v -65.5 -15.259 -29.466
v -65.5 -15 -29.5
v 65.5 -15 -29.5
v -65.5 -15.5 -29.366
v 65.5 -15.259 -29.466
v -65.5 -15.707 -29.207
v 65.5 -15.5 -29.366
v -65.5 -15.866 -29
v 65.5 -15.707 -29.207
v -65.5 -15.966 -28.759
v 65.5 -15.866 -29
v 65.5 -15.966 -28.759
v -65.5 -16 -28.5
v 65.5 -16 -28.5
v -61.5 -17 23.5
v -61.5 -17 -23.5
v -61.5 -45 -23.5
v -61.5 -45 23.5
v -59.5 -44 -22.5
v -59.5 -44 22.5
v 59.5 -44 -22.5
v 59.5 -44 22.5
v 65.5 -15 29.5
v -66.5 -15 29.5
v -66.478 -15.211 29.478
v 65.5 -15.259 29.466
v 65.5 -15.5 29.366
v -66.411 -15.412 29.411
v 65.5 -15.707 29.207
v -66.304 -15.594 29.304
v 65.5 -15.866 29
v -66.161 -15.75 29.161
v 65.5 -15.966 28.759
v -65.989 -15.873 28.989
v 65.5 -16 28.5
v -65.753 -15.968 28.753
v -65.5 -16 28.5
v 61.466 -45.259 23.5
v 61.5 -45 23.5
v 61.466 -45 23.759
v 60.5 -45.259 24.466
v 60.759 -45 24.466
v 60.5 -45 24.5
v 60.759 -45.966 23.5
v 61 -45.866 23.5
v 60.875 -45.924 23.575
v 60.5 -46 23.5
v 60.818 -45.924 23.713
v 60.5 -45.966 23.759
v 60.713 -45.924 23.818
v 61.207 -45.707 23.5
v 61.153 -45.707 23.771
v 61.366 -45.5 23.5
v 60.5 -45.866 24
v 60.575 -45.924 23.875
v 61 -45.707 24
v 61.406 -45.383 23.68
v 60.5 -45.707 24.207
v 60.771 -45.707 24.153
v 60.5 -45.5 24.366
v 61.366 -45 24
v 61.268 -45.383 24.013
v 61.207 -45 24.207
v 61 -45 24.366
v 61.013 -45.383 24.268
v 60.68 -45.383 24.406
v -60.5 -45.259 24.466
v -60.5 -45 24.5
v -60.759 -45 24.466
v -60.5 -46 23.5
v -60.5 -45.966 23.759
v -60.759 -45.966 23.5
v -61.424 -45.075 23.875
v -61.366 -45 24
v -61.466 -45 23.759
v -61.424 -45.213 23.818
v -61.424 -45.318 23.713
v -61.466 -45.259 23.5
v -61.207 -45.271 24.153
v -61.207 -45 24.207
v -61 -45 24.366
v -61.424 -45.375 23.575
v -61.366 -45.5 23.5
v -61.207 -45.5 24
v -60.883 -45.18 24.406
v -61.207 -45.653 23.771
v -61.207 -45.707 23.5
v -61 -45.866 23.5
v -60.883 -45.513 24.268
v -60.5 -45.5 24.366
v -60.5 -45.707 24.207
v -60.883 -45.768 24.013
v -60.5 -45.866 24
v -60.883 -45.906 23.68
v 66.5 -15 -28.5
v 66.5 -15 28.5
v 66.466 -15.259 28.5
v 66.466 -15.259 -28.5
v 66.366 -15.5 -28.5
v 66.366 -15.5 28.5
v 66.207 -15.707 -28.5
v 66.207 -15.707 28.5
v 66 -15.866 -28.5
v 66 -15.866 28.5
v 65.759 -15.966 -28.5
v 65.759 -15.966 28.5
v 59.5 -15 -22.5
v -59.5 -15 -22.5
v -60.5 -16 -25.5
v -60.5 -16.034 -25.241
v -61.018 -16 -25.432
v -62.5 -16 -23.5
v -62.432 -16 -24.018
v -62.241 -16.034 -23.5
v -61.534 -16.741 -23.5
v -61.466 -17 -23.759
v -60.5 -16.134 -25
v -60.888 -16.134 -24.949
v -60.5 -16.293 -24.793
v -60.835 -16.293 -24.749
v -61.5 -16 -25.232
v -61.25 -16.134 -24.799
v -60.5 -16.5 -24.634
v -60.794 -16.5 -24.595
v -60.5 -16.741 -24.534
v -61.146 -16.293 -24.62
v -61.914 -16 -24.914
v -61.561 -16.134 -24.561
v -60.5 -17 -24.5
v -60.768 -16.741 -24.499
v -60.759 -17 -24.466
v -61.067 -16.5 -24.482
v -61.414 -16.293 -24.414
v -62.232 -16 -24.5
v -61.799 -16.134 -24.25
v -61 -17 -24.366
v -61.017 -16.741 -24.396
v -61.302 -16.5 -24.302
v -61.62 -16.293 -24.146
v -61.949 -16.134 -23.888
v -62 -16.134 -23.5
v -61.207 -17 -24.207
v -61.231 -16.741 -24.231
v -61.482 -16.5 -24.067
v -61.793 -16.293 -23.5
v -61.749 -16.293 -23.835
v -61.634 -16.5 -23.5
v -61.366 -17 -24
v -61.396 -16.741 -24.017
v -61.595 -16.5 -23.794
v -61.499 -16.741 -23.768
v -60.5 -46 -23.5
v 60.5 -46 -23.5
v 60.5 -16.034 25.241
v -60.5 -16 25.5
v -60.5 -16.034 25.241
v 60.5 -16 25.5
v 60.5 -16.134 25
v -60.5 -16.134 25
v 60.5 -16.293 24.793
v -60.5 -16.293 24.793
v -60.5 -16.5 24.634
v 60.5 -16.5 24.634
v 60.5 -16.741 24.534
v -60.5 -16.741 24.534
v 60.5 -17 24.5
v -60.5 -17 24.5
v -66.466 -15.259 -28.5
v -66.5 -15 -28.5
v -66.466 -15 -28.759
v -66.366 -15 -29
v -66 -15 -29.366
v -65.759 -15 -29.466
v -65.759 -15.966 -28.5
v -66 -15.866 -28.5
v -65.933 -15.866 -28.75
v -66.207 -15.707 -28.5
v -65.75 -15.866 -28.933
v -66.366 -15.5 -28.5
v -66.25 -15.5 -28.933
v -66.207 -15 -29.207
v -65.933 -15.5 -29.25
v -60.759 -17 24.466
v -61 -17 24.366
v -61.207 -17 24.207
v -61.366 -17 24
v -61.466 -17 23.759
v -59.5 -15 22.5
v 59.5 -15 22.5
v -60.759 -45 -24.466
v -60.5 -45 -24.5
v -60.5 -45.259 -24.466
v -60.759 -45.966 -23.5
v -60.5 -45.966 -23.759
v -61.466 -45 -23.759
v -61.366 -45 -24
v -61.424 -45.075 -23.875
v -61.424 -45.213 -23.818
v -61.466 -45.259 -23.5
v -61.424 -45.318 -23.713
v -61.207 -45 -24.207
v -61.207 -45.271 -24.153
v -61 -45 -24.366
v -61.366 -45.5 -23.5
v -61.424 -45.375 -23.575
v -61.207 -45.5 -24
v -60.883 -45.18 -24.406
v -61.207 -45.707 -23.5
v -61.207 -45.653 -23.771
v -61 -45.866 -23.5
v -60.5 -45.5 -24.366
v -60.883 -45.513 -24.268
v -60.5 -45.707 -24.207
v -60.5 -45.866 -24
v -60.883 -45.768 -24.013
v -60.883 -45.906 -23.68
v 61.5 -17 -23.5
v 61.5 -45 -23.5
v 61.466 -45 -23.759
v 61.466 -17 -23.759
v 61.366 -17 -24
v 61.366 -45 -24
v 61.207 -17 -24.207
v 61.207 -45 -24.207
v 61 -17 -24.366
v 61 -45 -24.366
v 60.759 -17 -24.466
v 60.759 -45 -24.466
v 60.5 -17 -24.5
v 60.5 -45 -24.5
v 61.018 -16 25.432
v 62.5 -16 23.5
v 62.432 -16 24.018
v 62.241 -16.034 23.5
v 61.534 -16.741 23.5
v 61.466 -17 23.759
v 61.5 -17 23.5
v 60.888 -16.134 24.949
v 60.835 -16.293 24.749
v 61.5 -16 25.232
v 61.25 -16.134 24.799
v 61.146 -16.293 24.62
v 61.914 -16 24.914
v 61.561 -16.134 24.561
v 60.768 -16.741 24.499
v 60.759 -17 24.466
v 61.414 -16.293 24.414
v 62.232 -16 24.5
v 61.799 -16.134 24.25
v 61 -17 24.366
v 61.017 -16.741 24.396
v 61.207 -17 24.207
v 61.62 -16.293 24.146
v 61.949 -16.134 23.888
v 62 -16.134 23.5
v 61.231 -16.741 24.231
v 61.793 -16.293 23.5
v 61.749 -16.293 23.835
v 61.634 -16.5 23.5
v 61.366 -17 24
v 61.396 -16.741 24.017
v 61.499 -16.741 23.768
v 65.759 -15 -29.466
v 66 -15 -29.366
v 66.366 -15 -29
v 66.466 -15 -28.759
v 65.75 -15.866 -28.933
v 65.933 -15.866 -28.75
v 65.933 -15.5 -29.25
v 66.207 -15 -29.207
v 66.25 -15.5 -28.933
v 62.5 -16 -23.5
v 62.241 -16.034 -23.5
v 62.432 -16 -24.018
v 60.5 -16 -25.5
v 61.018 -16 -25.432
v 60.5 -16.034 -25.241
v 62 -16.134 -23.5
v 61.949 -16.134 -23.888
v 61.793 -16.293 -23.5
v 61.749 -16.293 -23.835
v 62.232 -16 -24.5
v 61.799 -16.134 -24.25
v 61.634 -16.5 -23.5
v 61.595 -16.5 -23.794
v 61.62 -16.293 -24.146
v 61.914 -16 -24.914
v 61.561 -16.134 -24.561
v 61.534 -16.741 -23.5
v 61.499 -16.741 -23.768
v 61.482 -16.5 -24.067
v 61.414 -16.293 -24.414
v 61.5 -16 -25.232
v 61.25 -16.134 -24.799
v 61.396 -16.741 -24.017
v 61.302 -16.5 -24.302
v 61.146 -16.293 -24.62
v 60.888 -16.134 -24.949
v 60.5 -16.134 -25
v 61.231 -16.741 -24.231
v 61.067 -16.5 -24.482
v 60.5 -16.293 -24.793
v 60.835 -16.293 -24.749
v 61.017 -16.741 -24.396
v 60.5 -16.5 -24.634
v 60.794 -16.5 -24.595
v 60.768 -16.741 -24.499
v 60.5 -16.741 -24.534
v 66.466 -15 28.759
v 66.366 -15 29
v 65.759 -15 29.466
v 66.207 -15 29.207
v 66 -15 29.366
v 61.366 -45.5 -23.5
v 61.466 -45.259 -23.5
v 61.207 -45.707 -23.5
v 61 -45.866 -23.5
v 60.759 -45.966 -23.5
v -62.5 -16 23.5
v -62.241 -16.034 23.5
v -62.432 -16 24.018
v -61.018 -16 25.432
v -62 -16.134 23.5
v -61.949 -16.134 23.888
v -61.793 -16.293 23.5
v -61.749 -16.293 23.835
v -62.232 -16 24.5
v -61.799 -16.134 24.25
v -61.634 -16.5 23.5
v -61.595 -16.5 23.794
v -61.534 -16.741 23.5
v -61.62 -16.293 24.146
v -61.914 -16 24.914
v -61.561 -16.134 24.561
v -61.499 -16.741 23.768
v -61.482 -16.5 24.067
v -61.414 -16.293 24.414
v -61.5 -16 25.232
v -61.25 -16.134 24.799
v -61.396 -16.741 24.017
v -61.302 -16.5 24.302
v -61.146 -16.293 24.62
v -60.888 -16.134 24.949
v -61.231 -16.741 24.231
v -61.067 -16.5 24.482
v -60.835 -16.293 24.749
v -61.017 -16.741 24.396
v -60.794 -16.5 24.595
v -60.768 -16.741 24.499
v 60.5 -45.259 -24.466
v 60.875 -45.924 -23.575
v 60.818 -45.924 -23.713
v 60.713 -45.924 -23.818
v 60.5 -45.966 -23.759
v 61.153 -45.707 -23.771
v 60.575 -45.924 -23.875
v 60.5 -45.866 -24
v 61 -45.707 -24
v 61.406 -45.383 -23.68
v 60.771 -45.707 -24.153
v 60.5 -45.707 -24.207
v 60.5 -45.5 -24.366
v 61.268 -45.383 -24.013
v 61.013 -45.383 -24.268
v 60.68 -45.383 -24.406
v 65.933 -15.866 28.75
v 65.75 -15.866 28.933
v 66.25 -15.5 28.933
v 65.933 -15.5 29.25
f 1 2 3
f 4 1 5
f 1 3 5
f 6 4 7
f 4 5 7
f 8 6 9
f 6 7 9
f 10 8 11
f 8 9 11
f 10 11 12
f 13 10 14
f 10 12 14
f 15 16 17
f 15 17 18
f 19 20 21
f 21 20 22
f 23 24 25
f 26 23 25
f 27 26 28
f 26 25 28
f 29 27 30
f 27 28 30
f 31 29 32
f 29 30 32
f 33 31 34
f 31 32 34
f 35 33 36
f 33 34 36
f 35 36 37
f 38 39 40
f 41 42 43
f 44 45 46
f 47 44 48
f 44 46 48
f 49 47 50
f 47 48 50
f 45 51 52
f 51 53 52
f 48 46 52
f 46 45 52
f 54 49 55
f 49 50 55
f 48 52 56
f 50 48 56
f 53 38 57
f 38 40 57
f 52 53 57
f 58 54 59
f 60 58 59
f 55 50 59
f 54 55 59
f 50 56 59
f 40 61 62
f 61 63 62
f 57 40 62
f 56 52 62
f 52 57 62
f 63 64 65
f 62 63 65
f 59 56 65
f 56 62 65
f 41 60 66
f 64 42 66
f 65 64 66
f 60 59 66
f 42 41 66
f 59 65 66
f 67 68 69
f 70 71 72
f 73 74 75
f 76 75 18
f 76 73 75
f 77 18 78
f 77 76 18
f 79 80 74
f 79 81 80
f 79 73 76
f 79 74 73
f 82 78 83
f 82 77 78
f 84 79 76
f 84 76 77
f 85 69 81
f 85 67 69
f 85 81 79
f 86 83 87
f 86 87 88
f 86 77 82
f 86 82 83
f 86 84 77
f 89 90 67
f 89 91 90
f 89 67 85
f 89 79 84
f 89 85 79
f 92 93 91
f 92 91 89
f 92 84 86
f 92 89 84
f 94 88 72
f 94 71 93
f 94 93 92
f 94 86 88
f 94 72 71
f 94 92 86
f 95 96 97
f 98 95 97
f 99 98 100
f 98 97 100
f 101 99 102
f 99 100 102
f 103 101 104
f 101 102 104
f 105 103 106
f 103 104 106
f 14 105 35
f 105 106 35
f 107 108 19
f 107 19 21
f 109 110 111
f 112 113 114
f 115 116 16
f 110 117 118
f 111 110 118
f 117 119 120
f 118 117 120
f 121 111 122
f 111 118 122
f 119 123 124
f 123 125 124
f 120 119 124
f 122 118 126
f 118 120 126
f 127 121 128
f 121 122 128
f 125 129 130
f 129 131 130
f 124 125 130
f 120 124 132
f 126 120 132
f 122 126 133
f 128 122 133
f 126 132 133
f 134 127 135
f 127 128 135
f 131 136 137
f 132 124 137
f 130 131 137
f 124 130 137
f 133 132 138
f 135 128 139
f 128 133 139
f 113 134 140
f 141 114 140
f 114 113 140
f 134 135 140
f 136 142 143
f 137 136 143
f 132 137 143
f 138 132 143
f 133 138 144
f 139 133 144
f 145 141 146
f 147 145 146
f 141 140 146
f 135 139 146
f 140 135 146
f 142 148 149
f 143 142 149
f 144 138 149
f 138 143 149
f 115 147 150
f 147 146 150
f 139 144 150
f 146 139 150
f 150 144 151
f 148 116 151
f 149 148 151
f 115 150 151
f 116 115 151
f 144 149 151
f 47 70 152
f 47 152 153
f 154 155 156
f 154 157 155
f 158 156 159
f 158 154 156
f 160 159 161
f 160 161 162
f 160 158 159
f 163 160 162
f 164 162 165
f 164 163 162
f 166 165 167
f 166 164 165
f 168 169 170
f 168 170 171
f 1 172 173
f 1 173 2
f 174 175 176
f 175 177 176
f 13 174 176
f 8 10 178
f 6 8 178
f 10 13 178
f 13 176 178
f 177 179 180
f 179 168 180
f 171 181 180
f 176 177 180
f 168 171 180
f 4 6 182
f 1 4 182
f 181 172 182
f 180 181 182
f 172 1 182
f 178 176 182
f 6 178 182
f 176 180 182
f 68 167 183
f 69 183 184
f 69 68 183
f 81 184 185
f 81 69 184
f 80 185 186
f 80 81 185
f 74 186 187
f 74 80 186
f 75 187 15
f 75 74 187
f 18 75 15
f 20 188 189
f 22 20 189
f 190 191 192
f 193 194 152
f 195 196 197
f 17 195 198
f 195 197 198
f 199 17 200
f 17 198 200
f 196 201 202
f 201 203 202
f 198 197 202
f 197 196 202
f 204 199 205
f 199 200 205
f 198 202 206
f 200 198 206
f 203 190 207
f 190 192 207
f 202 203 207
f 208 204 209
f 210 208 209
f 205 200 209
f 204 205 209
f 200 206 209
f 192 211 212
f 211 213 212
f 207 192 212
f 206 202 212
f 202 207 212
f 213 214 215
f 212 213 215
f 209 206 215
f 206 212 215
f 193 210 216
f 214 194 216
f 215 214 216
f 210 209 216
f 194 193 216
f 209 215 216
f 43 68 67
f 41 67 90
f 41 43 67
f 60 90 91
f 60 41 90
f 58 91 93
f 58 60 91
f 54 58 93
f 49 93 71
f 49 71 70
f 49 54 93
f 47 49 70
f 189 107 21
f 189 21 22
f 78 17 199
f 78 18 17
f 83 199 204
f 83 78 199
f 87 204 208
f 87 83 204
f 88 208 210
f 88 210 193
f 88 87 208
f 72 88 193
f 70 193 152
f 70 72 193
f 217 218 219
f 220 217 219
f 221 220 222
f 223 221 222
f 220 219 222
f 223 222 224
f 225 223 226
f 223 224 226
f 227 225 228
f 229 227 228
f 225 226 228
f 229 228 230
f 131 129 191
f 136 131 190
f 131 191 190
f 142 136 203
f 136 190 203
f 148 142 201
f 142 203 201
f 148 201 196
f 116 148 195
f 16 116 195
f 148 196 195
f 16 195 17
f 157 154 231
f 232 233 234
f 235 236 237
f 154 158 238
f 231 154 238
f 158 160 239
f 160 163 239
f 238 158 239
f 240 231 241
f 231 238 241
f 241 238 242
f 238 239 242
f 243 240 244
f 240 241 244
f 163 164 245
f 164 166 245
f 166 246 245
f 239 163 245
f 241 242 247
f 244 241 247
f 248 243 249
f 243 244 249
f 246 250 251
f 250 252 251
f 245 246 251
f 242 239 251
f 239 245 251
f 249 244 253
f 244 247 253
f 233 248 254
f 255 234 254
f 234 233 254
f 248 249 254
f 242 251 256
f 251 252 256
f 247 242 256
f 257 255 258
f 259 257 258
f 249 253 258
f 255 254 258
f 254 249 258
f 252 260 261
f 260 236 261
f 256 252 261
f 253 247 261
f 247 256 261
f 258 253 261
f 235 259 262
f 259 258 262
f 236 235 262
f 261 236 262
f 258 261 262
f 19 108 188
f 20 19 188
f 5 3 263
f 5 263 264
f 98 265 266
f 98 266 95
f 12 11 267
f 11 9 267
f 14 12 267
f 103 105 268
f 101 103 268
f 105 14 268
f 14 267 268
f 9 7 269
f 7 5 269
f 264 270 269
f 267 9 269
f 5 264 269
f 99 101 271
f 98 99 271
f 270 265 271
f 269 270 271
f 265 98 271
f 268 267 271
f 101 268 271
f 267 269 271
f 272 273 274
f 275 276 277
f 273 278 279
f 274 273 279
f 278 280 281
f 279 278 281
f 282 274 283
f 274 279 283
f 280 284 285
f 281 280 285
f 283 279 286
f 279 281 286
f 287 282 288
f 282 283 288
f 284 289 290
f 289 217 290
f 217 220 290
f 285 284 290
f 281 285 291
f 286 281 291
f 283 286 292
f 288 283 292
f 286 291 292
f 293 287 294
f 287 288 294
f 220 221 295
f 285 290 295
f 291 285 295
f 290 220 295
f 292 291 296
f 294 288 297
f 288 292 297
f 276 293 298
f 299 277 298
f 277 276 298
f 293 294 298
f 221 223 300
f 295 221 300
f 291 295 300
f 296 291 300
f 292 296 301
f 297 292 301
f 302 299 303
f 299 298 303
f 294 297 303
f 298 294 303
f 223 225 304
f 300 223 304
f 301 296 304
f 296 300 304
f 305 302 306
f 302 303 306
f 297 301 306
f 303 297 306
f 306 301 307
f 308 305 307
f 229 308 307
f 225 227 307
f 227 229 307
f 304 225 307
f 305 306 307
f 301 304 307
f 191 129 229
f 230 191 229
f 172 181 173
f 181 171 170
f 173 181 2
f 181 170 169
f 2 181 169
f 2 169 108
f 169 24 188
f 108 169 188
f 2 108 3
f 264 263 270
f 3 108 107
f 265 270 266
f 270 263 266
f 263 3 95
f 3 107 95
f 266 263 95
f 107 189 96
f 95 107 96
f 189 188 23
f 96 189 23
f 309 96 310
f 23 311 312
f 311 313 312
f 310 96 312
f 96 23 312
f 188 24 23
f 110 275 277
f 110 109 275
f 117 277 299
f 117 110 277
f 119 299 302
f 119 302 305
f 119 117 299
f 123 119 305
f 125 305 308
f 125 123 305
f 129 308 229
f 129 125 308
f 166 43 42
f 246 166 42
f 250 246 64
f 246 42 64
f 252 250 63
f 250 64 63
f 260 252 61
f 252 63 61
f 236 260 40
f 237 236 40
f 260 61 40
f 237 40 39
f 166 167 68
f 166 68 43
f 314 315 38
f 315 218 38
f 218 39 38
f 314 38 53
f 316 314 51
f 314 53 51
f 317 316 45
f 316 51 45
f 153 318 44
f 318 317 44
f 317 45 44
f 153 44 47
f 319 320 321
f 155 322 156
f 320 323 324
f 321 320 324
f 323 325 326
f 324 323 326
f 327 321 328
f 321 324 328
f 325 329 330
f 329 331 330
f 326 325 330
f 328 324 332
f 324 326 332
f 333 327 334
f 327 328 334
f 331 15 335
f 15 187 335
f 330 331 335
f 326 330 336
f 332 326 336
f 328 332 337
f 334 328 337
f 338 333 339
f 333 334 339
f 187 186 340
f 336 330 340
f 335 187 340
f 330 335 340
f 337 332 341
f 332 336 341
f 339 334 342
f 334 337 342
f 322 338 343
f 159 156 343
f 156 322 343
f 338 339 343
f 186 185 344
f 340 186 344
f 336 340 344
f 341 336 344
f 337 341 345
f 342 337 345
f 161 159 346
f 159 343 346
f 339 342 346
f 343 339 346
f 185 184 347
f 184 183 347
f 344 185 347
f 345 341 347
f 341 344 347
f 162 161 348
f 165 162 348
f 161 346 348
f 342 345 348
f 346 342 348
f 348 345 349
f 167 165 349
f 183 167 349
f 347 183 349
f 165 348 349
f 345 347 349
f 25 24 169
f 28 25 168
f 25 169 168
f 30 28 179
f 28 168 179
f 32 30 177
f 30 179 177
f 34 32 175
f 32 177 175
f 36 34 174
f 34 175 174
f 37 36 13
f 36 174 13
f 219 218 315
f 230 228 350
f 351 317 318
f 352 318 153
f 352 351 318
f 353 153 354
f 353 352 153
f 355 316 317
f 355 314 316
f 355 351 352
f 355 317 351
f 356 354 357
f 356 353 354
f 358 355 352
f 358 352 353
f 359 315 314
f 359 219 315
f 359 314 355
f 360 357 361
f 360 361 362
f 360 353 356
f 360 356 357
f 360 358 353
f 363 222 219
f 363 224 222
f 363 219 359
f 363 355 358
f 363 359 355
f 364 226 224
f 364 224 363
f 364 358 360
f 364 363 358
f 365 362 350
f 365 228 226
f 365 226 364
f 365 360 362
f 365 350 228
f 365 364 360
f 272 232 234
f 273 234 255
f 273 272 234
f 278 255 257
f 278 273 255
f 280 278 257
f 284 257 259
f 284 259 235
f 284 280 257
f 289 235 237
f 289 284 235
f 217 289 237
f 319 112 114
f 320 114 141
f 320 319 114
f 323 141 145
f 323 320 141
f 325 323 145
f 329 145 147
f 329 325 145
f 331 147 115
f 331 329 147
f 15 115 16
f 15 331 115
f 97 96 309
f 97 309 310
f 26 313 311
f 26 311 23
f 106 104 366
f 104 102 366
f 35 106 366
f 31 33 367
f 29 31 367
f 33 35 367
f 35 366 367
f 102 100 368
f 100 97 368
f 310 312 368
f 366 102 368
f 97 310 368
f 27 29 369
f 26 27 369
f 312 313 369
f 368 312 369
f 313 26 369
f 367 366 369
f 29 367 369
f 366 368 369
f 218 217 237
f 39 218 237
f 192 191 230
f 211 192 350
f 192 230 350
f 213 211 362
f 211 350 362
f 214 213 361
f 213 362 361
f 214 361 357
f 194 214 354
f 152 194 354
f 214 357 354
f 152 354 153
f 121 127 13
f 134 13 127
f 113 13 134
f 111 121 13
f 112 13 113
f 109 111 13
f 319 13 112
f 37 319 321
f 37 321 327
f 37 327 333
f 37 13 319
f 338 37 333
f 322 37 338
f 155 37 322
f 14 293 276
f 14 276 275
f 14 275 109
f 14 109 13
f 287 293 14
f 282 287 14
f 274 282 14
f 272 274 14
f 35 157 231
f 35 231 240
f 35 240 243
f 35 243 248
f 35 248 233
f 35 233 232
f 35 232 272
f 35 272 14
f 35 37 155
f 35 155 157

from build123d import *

# Parameters (mm, degrees)
F1_W        = 123
F1_H        = 49
F1_W_2      = 119
F1_H_2      = 45
F2_DEPTH    = 31
F1_H_3      = 5
F3_DEPTH    = 1
F4_DEPTH    = 31
F5_DEPTH    = 29
F6_F1_R     = 0.9999
F6_F2_R     = 1
F7_T1_DEPTH = 3.5
F7_T4_ANGLE = 90
F7_T6_ANGLE = 90
F7_T8_ANGLE = 90


# Not quite as in the source:
# - a fillet or chamfer that OpenCascade refuses, or shapes differently, is made with other operations: its cross-section is extruded or revolved along the edge and cut away or added
# - a fillet or chamfer is up to 0.001 mm smaller than in the source, because OpenCascade refuses the exact size


with BuildPart() as f2:
    # F1 (on offset) → F2 (new body)
    with BuildSketch(Plane.XZ.offset(15)):
        Rectangle(F1_W, F1_H)
        Rectangle(F1_W_2, F1_H_2, mode=Mode.SUBTRACT)
    extrude(amount=F2_DEPTH)

    # F1 (on offset) → F3 (join)
    with BuildSketch(Plane.XZ.offset(15)):
        with Locations((0, 27)):
            Rectangle(F1_W, F1_H_3)
        Polygon((-61.5, -29.5), (-61.5, -24.5), (-61.5, 24.5), (-61.5, 29.5), (-66.5, 29.5), (-66.5, -29.5), align=None)
        with Locations((0, -27)):
            Rectangle(F1_W, F1_H_3)
        Polygon((61.5, 24.5), (61.5, -24.5), (61.5, -29.5), (66.5, -29.5), (66.5, 29.5), (61.5, 29.5), align=None)
    extrude(amount=F3_DEPTH)

    # F1 (on offset) → F4 (join)
    with BuildSketch(Plane.XZ.offset(15)):
        Rectangle(F1_W_2, F1_H_2)
    extrude(amount=F4_DEPTH)

    # F1 (on offset) → F5 (cut)
    with BuildSketch(Plane.XZ.offset(15)):
        Rectangle(F1_W_2, F1_H_2)
    extrude(amount=F5_DEPTH, mode=Mode.SUBTRACT)

    # F6: fillet of radius 1 on 14 edges, made by hand

    # F6_f1 (radius 1 in the source; OpenCascade refuses exactly that, so slightly less here)
    f6_f1_edges = [f2.edges().sort_by_distance(p)[0] for p in [
        (61.5, -31, 24.5),
        (61.5, -31, -24.5),
        (61.5, -46, 0),
        (0, -46, -24.5),
        (0, -46, 24.5),
        (-61.5, -31, -24.5),
        (-61.5, -31, 24.5),
        (-61.5, -46, 0),
        (0, -16, -29.5),
        (-66.5, -16, 0),
        (0, -16, 29.5),
        (66.5, -16, 0),
    ]]
    fillet(f6_f1_edges, radius=F6_F1_R)

    # F6_f2
    f6_f2_edges = [f2.edges().sort_by_distance(p)[0] for p in [
        (61.5, -16, 0),
        (-61.5, -16, 0),
        (-61.2071360705, -16, -24.2071360705),
        (-61.2071360705, -16, 24.2071360705),
        (61.2071360705, -16, 24.2071360705),
        (61.2071360705, -16, -24.2071360705),
    ]]
    fillet(f6_f2_edges, radius=F6_F2_R)

    # F7: fillet of radius 1 on 7 edges, made by hand

    # F7_s2 → F7_t1 (cut)
    with BuildSketch(Plane.XZ.offset(12.5)):
        with BuildLine():
            ThreePointArc((-65.5, -29.5), (-66.2071067812, -29.2071067812), (-66.5, -28.5))
            Line((-66.5, -28.5), (-66.5, -29.5))
            Line((-66.5, -29.5), (-65.5, -29.5))
        make_face()
        with BuildLine():
            ThreePointArc((65.5, -29.5), (66.2071067812, -29.2071067812), (66.5, -28.5))
            Line((66.5, -28.5), (66.5, -29.5))
            Line((66.5, -29.5), (65.5, -29.5))
        make_face()
        with BuildLine():
            ThreePointArc((66.5, 28.5), (66.2071067812, 29.2071067812), (65.5, 29.5))
            Line((65.5, 29.5), (66.5, 29.5))
            Line((66.5, 29.5), (66.5, 28.5))
        make_face()
    extrude(amount=F7_T1_DEPTH, mode=Mode.SUBTRACT)

    # F7_s3 → F7_t4 (revolve, cut)
    with BuildSketch(Plane.XY.offset(-28.5)):
        with BuildLine():
            ThreePointArc((-65.5001, -16), (-66.2071360705, -15.7071360705), (-66.5, -15.0001))
            Line((-66.5, -15.0001), (-66.5, -16))
            Line((-66.5, -16), (-65.5001, -16))
        make_face()
    revolve(axis=Axis((-65.5, -16, -28.5), (0, -1, 0)), revolution_arc=F7_T4_ANGLE, mode=Mode.SUBTRACT)

    # F7_s5 → F7_t6 (revolve, cut)
    with BuildSketch(Plane.YZ.offset(65.5)):
        with BuildLine():
            ThreePointArc((-16, -28.5001), (-15.7071360705, -29.2071360705), (-15.0001, -29.5))
            Line((-15.0001, -29.5), (-16, -29.5))
            Line((-16, -29.5), (-16, -28.5001))
        make_face()
    revolve(axis=Axis((65.5, -16, -28.5), (0, -1, 0)), revolution_arc=F7_T6_ANGLE, mode=Mode.SUBTRACT)

    # F7_s7 → F7_t8 (revolve, cut)
    with BuildSketch(Plane.XY.offset(28.5)):
        with BuildLine():
            ThreePointArc((65.5001, -16), (66.2071360705, -15.7071360705), (66.5, -15.0001))
            Line((66.5, -15.0001), (66.5, -16))
            Line((66.5, -16), (65.5001, -16))
        make_face()
    revolve(axis=Axis((65.5, -16, 28.5), (0, -1, 0)), revolution_arc=F7_T8_ANGLE, mode=Mode.SUBTRACT)


solid = f2.part
